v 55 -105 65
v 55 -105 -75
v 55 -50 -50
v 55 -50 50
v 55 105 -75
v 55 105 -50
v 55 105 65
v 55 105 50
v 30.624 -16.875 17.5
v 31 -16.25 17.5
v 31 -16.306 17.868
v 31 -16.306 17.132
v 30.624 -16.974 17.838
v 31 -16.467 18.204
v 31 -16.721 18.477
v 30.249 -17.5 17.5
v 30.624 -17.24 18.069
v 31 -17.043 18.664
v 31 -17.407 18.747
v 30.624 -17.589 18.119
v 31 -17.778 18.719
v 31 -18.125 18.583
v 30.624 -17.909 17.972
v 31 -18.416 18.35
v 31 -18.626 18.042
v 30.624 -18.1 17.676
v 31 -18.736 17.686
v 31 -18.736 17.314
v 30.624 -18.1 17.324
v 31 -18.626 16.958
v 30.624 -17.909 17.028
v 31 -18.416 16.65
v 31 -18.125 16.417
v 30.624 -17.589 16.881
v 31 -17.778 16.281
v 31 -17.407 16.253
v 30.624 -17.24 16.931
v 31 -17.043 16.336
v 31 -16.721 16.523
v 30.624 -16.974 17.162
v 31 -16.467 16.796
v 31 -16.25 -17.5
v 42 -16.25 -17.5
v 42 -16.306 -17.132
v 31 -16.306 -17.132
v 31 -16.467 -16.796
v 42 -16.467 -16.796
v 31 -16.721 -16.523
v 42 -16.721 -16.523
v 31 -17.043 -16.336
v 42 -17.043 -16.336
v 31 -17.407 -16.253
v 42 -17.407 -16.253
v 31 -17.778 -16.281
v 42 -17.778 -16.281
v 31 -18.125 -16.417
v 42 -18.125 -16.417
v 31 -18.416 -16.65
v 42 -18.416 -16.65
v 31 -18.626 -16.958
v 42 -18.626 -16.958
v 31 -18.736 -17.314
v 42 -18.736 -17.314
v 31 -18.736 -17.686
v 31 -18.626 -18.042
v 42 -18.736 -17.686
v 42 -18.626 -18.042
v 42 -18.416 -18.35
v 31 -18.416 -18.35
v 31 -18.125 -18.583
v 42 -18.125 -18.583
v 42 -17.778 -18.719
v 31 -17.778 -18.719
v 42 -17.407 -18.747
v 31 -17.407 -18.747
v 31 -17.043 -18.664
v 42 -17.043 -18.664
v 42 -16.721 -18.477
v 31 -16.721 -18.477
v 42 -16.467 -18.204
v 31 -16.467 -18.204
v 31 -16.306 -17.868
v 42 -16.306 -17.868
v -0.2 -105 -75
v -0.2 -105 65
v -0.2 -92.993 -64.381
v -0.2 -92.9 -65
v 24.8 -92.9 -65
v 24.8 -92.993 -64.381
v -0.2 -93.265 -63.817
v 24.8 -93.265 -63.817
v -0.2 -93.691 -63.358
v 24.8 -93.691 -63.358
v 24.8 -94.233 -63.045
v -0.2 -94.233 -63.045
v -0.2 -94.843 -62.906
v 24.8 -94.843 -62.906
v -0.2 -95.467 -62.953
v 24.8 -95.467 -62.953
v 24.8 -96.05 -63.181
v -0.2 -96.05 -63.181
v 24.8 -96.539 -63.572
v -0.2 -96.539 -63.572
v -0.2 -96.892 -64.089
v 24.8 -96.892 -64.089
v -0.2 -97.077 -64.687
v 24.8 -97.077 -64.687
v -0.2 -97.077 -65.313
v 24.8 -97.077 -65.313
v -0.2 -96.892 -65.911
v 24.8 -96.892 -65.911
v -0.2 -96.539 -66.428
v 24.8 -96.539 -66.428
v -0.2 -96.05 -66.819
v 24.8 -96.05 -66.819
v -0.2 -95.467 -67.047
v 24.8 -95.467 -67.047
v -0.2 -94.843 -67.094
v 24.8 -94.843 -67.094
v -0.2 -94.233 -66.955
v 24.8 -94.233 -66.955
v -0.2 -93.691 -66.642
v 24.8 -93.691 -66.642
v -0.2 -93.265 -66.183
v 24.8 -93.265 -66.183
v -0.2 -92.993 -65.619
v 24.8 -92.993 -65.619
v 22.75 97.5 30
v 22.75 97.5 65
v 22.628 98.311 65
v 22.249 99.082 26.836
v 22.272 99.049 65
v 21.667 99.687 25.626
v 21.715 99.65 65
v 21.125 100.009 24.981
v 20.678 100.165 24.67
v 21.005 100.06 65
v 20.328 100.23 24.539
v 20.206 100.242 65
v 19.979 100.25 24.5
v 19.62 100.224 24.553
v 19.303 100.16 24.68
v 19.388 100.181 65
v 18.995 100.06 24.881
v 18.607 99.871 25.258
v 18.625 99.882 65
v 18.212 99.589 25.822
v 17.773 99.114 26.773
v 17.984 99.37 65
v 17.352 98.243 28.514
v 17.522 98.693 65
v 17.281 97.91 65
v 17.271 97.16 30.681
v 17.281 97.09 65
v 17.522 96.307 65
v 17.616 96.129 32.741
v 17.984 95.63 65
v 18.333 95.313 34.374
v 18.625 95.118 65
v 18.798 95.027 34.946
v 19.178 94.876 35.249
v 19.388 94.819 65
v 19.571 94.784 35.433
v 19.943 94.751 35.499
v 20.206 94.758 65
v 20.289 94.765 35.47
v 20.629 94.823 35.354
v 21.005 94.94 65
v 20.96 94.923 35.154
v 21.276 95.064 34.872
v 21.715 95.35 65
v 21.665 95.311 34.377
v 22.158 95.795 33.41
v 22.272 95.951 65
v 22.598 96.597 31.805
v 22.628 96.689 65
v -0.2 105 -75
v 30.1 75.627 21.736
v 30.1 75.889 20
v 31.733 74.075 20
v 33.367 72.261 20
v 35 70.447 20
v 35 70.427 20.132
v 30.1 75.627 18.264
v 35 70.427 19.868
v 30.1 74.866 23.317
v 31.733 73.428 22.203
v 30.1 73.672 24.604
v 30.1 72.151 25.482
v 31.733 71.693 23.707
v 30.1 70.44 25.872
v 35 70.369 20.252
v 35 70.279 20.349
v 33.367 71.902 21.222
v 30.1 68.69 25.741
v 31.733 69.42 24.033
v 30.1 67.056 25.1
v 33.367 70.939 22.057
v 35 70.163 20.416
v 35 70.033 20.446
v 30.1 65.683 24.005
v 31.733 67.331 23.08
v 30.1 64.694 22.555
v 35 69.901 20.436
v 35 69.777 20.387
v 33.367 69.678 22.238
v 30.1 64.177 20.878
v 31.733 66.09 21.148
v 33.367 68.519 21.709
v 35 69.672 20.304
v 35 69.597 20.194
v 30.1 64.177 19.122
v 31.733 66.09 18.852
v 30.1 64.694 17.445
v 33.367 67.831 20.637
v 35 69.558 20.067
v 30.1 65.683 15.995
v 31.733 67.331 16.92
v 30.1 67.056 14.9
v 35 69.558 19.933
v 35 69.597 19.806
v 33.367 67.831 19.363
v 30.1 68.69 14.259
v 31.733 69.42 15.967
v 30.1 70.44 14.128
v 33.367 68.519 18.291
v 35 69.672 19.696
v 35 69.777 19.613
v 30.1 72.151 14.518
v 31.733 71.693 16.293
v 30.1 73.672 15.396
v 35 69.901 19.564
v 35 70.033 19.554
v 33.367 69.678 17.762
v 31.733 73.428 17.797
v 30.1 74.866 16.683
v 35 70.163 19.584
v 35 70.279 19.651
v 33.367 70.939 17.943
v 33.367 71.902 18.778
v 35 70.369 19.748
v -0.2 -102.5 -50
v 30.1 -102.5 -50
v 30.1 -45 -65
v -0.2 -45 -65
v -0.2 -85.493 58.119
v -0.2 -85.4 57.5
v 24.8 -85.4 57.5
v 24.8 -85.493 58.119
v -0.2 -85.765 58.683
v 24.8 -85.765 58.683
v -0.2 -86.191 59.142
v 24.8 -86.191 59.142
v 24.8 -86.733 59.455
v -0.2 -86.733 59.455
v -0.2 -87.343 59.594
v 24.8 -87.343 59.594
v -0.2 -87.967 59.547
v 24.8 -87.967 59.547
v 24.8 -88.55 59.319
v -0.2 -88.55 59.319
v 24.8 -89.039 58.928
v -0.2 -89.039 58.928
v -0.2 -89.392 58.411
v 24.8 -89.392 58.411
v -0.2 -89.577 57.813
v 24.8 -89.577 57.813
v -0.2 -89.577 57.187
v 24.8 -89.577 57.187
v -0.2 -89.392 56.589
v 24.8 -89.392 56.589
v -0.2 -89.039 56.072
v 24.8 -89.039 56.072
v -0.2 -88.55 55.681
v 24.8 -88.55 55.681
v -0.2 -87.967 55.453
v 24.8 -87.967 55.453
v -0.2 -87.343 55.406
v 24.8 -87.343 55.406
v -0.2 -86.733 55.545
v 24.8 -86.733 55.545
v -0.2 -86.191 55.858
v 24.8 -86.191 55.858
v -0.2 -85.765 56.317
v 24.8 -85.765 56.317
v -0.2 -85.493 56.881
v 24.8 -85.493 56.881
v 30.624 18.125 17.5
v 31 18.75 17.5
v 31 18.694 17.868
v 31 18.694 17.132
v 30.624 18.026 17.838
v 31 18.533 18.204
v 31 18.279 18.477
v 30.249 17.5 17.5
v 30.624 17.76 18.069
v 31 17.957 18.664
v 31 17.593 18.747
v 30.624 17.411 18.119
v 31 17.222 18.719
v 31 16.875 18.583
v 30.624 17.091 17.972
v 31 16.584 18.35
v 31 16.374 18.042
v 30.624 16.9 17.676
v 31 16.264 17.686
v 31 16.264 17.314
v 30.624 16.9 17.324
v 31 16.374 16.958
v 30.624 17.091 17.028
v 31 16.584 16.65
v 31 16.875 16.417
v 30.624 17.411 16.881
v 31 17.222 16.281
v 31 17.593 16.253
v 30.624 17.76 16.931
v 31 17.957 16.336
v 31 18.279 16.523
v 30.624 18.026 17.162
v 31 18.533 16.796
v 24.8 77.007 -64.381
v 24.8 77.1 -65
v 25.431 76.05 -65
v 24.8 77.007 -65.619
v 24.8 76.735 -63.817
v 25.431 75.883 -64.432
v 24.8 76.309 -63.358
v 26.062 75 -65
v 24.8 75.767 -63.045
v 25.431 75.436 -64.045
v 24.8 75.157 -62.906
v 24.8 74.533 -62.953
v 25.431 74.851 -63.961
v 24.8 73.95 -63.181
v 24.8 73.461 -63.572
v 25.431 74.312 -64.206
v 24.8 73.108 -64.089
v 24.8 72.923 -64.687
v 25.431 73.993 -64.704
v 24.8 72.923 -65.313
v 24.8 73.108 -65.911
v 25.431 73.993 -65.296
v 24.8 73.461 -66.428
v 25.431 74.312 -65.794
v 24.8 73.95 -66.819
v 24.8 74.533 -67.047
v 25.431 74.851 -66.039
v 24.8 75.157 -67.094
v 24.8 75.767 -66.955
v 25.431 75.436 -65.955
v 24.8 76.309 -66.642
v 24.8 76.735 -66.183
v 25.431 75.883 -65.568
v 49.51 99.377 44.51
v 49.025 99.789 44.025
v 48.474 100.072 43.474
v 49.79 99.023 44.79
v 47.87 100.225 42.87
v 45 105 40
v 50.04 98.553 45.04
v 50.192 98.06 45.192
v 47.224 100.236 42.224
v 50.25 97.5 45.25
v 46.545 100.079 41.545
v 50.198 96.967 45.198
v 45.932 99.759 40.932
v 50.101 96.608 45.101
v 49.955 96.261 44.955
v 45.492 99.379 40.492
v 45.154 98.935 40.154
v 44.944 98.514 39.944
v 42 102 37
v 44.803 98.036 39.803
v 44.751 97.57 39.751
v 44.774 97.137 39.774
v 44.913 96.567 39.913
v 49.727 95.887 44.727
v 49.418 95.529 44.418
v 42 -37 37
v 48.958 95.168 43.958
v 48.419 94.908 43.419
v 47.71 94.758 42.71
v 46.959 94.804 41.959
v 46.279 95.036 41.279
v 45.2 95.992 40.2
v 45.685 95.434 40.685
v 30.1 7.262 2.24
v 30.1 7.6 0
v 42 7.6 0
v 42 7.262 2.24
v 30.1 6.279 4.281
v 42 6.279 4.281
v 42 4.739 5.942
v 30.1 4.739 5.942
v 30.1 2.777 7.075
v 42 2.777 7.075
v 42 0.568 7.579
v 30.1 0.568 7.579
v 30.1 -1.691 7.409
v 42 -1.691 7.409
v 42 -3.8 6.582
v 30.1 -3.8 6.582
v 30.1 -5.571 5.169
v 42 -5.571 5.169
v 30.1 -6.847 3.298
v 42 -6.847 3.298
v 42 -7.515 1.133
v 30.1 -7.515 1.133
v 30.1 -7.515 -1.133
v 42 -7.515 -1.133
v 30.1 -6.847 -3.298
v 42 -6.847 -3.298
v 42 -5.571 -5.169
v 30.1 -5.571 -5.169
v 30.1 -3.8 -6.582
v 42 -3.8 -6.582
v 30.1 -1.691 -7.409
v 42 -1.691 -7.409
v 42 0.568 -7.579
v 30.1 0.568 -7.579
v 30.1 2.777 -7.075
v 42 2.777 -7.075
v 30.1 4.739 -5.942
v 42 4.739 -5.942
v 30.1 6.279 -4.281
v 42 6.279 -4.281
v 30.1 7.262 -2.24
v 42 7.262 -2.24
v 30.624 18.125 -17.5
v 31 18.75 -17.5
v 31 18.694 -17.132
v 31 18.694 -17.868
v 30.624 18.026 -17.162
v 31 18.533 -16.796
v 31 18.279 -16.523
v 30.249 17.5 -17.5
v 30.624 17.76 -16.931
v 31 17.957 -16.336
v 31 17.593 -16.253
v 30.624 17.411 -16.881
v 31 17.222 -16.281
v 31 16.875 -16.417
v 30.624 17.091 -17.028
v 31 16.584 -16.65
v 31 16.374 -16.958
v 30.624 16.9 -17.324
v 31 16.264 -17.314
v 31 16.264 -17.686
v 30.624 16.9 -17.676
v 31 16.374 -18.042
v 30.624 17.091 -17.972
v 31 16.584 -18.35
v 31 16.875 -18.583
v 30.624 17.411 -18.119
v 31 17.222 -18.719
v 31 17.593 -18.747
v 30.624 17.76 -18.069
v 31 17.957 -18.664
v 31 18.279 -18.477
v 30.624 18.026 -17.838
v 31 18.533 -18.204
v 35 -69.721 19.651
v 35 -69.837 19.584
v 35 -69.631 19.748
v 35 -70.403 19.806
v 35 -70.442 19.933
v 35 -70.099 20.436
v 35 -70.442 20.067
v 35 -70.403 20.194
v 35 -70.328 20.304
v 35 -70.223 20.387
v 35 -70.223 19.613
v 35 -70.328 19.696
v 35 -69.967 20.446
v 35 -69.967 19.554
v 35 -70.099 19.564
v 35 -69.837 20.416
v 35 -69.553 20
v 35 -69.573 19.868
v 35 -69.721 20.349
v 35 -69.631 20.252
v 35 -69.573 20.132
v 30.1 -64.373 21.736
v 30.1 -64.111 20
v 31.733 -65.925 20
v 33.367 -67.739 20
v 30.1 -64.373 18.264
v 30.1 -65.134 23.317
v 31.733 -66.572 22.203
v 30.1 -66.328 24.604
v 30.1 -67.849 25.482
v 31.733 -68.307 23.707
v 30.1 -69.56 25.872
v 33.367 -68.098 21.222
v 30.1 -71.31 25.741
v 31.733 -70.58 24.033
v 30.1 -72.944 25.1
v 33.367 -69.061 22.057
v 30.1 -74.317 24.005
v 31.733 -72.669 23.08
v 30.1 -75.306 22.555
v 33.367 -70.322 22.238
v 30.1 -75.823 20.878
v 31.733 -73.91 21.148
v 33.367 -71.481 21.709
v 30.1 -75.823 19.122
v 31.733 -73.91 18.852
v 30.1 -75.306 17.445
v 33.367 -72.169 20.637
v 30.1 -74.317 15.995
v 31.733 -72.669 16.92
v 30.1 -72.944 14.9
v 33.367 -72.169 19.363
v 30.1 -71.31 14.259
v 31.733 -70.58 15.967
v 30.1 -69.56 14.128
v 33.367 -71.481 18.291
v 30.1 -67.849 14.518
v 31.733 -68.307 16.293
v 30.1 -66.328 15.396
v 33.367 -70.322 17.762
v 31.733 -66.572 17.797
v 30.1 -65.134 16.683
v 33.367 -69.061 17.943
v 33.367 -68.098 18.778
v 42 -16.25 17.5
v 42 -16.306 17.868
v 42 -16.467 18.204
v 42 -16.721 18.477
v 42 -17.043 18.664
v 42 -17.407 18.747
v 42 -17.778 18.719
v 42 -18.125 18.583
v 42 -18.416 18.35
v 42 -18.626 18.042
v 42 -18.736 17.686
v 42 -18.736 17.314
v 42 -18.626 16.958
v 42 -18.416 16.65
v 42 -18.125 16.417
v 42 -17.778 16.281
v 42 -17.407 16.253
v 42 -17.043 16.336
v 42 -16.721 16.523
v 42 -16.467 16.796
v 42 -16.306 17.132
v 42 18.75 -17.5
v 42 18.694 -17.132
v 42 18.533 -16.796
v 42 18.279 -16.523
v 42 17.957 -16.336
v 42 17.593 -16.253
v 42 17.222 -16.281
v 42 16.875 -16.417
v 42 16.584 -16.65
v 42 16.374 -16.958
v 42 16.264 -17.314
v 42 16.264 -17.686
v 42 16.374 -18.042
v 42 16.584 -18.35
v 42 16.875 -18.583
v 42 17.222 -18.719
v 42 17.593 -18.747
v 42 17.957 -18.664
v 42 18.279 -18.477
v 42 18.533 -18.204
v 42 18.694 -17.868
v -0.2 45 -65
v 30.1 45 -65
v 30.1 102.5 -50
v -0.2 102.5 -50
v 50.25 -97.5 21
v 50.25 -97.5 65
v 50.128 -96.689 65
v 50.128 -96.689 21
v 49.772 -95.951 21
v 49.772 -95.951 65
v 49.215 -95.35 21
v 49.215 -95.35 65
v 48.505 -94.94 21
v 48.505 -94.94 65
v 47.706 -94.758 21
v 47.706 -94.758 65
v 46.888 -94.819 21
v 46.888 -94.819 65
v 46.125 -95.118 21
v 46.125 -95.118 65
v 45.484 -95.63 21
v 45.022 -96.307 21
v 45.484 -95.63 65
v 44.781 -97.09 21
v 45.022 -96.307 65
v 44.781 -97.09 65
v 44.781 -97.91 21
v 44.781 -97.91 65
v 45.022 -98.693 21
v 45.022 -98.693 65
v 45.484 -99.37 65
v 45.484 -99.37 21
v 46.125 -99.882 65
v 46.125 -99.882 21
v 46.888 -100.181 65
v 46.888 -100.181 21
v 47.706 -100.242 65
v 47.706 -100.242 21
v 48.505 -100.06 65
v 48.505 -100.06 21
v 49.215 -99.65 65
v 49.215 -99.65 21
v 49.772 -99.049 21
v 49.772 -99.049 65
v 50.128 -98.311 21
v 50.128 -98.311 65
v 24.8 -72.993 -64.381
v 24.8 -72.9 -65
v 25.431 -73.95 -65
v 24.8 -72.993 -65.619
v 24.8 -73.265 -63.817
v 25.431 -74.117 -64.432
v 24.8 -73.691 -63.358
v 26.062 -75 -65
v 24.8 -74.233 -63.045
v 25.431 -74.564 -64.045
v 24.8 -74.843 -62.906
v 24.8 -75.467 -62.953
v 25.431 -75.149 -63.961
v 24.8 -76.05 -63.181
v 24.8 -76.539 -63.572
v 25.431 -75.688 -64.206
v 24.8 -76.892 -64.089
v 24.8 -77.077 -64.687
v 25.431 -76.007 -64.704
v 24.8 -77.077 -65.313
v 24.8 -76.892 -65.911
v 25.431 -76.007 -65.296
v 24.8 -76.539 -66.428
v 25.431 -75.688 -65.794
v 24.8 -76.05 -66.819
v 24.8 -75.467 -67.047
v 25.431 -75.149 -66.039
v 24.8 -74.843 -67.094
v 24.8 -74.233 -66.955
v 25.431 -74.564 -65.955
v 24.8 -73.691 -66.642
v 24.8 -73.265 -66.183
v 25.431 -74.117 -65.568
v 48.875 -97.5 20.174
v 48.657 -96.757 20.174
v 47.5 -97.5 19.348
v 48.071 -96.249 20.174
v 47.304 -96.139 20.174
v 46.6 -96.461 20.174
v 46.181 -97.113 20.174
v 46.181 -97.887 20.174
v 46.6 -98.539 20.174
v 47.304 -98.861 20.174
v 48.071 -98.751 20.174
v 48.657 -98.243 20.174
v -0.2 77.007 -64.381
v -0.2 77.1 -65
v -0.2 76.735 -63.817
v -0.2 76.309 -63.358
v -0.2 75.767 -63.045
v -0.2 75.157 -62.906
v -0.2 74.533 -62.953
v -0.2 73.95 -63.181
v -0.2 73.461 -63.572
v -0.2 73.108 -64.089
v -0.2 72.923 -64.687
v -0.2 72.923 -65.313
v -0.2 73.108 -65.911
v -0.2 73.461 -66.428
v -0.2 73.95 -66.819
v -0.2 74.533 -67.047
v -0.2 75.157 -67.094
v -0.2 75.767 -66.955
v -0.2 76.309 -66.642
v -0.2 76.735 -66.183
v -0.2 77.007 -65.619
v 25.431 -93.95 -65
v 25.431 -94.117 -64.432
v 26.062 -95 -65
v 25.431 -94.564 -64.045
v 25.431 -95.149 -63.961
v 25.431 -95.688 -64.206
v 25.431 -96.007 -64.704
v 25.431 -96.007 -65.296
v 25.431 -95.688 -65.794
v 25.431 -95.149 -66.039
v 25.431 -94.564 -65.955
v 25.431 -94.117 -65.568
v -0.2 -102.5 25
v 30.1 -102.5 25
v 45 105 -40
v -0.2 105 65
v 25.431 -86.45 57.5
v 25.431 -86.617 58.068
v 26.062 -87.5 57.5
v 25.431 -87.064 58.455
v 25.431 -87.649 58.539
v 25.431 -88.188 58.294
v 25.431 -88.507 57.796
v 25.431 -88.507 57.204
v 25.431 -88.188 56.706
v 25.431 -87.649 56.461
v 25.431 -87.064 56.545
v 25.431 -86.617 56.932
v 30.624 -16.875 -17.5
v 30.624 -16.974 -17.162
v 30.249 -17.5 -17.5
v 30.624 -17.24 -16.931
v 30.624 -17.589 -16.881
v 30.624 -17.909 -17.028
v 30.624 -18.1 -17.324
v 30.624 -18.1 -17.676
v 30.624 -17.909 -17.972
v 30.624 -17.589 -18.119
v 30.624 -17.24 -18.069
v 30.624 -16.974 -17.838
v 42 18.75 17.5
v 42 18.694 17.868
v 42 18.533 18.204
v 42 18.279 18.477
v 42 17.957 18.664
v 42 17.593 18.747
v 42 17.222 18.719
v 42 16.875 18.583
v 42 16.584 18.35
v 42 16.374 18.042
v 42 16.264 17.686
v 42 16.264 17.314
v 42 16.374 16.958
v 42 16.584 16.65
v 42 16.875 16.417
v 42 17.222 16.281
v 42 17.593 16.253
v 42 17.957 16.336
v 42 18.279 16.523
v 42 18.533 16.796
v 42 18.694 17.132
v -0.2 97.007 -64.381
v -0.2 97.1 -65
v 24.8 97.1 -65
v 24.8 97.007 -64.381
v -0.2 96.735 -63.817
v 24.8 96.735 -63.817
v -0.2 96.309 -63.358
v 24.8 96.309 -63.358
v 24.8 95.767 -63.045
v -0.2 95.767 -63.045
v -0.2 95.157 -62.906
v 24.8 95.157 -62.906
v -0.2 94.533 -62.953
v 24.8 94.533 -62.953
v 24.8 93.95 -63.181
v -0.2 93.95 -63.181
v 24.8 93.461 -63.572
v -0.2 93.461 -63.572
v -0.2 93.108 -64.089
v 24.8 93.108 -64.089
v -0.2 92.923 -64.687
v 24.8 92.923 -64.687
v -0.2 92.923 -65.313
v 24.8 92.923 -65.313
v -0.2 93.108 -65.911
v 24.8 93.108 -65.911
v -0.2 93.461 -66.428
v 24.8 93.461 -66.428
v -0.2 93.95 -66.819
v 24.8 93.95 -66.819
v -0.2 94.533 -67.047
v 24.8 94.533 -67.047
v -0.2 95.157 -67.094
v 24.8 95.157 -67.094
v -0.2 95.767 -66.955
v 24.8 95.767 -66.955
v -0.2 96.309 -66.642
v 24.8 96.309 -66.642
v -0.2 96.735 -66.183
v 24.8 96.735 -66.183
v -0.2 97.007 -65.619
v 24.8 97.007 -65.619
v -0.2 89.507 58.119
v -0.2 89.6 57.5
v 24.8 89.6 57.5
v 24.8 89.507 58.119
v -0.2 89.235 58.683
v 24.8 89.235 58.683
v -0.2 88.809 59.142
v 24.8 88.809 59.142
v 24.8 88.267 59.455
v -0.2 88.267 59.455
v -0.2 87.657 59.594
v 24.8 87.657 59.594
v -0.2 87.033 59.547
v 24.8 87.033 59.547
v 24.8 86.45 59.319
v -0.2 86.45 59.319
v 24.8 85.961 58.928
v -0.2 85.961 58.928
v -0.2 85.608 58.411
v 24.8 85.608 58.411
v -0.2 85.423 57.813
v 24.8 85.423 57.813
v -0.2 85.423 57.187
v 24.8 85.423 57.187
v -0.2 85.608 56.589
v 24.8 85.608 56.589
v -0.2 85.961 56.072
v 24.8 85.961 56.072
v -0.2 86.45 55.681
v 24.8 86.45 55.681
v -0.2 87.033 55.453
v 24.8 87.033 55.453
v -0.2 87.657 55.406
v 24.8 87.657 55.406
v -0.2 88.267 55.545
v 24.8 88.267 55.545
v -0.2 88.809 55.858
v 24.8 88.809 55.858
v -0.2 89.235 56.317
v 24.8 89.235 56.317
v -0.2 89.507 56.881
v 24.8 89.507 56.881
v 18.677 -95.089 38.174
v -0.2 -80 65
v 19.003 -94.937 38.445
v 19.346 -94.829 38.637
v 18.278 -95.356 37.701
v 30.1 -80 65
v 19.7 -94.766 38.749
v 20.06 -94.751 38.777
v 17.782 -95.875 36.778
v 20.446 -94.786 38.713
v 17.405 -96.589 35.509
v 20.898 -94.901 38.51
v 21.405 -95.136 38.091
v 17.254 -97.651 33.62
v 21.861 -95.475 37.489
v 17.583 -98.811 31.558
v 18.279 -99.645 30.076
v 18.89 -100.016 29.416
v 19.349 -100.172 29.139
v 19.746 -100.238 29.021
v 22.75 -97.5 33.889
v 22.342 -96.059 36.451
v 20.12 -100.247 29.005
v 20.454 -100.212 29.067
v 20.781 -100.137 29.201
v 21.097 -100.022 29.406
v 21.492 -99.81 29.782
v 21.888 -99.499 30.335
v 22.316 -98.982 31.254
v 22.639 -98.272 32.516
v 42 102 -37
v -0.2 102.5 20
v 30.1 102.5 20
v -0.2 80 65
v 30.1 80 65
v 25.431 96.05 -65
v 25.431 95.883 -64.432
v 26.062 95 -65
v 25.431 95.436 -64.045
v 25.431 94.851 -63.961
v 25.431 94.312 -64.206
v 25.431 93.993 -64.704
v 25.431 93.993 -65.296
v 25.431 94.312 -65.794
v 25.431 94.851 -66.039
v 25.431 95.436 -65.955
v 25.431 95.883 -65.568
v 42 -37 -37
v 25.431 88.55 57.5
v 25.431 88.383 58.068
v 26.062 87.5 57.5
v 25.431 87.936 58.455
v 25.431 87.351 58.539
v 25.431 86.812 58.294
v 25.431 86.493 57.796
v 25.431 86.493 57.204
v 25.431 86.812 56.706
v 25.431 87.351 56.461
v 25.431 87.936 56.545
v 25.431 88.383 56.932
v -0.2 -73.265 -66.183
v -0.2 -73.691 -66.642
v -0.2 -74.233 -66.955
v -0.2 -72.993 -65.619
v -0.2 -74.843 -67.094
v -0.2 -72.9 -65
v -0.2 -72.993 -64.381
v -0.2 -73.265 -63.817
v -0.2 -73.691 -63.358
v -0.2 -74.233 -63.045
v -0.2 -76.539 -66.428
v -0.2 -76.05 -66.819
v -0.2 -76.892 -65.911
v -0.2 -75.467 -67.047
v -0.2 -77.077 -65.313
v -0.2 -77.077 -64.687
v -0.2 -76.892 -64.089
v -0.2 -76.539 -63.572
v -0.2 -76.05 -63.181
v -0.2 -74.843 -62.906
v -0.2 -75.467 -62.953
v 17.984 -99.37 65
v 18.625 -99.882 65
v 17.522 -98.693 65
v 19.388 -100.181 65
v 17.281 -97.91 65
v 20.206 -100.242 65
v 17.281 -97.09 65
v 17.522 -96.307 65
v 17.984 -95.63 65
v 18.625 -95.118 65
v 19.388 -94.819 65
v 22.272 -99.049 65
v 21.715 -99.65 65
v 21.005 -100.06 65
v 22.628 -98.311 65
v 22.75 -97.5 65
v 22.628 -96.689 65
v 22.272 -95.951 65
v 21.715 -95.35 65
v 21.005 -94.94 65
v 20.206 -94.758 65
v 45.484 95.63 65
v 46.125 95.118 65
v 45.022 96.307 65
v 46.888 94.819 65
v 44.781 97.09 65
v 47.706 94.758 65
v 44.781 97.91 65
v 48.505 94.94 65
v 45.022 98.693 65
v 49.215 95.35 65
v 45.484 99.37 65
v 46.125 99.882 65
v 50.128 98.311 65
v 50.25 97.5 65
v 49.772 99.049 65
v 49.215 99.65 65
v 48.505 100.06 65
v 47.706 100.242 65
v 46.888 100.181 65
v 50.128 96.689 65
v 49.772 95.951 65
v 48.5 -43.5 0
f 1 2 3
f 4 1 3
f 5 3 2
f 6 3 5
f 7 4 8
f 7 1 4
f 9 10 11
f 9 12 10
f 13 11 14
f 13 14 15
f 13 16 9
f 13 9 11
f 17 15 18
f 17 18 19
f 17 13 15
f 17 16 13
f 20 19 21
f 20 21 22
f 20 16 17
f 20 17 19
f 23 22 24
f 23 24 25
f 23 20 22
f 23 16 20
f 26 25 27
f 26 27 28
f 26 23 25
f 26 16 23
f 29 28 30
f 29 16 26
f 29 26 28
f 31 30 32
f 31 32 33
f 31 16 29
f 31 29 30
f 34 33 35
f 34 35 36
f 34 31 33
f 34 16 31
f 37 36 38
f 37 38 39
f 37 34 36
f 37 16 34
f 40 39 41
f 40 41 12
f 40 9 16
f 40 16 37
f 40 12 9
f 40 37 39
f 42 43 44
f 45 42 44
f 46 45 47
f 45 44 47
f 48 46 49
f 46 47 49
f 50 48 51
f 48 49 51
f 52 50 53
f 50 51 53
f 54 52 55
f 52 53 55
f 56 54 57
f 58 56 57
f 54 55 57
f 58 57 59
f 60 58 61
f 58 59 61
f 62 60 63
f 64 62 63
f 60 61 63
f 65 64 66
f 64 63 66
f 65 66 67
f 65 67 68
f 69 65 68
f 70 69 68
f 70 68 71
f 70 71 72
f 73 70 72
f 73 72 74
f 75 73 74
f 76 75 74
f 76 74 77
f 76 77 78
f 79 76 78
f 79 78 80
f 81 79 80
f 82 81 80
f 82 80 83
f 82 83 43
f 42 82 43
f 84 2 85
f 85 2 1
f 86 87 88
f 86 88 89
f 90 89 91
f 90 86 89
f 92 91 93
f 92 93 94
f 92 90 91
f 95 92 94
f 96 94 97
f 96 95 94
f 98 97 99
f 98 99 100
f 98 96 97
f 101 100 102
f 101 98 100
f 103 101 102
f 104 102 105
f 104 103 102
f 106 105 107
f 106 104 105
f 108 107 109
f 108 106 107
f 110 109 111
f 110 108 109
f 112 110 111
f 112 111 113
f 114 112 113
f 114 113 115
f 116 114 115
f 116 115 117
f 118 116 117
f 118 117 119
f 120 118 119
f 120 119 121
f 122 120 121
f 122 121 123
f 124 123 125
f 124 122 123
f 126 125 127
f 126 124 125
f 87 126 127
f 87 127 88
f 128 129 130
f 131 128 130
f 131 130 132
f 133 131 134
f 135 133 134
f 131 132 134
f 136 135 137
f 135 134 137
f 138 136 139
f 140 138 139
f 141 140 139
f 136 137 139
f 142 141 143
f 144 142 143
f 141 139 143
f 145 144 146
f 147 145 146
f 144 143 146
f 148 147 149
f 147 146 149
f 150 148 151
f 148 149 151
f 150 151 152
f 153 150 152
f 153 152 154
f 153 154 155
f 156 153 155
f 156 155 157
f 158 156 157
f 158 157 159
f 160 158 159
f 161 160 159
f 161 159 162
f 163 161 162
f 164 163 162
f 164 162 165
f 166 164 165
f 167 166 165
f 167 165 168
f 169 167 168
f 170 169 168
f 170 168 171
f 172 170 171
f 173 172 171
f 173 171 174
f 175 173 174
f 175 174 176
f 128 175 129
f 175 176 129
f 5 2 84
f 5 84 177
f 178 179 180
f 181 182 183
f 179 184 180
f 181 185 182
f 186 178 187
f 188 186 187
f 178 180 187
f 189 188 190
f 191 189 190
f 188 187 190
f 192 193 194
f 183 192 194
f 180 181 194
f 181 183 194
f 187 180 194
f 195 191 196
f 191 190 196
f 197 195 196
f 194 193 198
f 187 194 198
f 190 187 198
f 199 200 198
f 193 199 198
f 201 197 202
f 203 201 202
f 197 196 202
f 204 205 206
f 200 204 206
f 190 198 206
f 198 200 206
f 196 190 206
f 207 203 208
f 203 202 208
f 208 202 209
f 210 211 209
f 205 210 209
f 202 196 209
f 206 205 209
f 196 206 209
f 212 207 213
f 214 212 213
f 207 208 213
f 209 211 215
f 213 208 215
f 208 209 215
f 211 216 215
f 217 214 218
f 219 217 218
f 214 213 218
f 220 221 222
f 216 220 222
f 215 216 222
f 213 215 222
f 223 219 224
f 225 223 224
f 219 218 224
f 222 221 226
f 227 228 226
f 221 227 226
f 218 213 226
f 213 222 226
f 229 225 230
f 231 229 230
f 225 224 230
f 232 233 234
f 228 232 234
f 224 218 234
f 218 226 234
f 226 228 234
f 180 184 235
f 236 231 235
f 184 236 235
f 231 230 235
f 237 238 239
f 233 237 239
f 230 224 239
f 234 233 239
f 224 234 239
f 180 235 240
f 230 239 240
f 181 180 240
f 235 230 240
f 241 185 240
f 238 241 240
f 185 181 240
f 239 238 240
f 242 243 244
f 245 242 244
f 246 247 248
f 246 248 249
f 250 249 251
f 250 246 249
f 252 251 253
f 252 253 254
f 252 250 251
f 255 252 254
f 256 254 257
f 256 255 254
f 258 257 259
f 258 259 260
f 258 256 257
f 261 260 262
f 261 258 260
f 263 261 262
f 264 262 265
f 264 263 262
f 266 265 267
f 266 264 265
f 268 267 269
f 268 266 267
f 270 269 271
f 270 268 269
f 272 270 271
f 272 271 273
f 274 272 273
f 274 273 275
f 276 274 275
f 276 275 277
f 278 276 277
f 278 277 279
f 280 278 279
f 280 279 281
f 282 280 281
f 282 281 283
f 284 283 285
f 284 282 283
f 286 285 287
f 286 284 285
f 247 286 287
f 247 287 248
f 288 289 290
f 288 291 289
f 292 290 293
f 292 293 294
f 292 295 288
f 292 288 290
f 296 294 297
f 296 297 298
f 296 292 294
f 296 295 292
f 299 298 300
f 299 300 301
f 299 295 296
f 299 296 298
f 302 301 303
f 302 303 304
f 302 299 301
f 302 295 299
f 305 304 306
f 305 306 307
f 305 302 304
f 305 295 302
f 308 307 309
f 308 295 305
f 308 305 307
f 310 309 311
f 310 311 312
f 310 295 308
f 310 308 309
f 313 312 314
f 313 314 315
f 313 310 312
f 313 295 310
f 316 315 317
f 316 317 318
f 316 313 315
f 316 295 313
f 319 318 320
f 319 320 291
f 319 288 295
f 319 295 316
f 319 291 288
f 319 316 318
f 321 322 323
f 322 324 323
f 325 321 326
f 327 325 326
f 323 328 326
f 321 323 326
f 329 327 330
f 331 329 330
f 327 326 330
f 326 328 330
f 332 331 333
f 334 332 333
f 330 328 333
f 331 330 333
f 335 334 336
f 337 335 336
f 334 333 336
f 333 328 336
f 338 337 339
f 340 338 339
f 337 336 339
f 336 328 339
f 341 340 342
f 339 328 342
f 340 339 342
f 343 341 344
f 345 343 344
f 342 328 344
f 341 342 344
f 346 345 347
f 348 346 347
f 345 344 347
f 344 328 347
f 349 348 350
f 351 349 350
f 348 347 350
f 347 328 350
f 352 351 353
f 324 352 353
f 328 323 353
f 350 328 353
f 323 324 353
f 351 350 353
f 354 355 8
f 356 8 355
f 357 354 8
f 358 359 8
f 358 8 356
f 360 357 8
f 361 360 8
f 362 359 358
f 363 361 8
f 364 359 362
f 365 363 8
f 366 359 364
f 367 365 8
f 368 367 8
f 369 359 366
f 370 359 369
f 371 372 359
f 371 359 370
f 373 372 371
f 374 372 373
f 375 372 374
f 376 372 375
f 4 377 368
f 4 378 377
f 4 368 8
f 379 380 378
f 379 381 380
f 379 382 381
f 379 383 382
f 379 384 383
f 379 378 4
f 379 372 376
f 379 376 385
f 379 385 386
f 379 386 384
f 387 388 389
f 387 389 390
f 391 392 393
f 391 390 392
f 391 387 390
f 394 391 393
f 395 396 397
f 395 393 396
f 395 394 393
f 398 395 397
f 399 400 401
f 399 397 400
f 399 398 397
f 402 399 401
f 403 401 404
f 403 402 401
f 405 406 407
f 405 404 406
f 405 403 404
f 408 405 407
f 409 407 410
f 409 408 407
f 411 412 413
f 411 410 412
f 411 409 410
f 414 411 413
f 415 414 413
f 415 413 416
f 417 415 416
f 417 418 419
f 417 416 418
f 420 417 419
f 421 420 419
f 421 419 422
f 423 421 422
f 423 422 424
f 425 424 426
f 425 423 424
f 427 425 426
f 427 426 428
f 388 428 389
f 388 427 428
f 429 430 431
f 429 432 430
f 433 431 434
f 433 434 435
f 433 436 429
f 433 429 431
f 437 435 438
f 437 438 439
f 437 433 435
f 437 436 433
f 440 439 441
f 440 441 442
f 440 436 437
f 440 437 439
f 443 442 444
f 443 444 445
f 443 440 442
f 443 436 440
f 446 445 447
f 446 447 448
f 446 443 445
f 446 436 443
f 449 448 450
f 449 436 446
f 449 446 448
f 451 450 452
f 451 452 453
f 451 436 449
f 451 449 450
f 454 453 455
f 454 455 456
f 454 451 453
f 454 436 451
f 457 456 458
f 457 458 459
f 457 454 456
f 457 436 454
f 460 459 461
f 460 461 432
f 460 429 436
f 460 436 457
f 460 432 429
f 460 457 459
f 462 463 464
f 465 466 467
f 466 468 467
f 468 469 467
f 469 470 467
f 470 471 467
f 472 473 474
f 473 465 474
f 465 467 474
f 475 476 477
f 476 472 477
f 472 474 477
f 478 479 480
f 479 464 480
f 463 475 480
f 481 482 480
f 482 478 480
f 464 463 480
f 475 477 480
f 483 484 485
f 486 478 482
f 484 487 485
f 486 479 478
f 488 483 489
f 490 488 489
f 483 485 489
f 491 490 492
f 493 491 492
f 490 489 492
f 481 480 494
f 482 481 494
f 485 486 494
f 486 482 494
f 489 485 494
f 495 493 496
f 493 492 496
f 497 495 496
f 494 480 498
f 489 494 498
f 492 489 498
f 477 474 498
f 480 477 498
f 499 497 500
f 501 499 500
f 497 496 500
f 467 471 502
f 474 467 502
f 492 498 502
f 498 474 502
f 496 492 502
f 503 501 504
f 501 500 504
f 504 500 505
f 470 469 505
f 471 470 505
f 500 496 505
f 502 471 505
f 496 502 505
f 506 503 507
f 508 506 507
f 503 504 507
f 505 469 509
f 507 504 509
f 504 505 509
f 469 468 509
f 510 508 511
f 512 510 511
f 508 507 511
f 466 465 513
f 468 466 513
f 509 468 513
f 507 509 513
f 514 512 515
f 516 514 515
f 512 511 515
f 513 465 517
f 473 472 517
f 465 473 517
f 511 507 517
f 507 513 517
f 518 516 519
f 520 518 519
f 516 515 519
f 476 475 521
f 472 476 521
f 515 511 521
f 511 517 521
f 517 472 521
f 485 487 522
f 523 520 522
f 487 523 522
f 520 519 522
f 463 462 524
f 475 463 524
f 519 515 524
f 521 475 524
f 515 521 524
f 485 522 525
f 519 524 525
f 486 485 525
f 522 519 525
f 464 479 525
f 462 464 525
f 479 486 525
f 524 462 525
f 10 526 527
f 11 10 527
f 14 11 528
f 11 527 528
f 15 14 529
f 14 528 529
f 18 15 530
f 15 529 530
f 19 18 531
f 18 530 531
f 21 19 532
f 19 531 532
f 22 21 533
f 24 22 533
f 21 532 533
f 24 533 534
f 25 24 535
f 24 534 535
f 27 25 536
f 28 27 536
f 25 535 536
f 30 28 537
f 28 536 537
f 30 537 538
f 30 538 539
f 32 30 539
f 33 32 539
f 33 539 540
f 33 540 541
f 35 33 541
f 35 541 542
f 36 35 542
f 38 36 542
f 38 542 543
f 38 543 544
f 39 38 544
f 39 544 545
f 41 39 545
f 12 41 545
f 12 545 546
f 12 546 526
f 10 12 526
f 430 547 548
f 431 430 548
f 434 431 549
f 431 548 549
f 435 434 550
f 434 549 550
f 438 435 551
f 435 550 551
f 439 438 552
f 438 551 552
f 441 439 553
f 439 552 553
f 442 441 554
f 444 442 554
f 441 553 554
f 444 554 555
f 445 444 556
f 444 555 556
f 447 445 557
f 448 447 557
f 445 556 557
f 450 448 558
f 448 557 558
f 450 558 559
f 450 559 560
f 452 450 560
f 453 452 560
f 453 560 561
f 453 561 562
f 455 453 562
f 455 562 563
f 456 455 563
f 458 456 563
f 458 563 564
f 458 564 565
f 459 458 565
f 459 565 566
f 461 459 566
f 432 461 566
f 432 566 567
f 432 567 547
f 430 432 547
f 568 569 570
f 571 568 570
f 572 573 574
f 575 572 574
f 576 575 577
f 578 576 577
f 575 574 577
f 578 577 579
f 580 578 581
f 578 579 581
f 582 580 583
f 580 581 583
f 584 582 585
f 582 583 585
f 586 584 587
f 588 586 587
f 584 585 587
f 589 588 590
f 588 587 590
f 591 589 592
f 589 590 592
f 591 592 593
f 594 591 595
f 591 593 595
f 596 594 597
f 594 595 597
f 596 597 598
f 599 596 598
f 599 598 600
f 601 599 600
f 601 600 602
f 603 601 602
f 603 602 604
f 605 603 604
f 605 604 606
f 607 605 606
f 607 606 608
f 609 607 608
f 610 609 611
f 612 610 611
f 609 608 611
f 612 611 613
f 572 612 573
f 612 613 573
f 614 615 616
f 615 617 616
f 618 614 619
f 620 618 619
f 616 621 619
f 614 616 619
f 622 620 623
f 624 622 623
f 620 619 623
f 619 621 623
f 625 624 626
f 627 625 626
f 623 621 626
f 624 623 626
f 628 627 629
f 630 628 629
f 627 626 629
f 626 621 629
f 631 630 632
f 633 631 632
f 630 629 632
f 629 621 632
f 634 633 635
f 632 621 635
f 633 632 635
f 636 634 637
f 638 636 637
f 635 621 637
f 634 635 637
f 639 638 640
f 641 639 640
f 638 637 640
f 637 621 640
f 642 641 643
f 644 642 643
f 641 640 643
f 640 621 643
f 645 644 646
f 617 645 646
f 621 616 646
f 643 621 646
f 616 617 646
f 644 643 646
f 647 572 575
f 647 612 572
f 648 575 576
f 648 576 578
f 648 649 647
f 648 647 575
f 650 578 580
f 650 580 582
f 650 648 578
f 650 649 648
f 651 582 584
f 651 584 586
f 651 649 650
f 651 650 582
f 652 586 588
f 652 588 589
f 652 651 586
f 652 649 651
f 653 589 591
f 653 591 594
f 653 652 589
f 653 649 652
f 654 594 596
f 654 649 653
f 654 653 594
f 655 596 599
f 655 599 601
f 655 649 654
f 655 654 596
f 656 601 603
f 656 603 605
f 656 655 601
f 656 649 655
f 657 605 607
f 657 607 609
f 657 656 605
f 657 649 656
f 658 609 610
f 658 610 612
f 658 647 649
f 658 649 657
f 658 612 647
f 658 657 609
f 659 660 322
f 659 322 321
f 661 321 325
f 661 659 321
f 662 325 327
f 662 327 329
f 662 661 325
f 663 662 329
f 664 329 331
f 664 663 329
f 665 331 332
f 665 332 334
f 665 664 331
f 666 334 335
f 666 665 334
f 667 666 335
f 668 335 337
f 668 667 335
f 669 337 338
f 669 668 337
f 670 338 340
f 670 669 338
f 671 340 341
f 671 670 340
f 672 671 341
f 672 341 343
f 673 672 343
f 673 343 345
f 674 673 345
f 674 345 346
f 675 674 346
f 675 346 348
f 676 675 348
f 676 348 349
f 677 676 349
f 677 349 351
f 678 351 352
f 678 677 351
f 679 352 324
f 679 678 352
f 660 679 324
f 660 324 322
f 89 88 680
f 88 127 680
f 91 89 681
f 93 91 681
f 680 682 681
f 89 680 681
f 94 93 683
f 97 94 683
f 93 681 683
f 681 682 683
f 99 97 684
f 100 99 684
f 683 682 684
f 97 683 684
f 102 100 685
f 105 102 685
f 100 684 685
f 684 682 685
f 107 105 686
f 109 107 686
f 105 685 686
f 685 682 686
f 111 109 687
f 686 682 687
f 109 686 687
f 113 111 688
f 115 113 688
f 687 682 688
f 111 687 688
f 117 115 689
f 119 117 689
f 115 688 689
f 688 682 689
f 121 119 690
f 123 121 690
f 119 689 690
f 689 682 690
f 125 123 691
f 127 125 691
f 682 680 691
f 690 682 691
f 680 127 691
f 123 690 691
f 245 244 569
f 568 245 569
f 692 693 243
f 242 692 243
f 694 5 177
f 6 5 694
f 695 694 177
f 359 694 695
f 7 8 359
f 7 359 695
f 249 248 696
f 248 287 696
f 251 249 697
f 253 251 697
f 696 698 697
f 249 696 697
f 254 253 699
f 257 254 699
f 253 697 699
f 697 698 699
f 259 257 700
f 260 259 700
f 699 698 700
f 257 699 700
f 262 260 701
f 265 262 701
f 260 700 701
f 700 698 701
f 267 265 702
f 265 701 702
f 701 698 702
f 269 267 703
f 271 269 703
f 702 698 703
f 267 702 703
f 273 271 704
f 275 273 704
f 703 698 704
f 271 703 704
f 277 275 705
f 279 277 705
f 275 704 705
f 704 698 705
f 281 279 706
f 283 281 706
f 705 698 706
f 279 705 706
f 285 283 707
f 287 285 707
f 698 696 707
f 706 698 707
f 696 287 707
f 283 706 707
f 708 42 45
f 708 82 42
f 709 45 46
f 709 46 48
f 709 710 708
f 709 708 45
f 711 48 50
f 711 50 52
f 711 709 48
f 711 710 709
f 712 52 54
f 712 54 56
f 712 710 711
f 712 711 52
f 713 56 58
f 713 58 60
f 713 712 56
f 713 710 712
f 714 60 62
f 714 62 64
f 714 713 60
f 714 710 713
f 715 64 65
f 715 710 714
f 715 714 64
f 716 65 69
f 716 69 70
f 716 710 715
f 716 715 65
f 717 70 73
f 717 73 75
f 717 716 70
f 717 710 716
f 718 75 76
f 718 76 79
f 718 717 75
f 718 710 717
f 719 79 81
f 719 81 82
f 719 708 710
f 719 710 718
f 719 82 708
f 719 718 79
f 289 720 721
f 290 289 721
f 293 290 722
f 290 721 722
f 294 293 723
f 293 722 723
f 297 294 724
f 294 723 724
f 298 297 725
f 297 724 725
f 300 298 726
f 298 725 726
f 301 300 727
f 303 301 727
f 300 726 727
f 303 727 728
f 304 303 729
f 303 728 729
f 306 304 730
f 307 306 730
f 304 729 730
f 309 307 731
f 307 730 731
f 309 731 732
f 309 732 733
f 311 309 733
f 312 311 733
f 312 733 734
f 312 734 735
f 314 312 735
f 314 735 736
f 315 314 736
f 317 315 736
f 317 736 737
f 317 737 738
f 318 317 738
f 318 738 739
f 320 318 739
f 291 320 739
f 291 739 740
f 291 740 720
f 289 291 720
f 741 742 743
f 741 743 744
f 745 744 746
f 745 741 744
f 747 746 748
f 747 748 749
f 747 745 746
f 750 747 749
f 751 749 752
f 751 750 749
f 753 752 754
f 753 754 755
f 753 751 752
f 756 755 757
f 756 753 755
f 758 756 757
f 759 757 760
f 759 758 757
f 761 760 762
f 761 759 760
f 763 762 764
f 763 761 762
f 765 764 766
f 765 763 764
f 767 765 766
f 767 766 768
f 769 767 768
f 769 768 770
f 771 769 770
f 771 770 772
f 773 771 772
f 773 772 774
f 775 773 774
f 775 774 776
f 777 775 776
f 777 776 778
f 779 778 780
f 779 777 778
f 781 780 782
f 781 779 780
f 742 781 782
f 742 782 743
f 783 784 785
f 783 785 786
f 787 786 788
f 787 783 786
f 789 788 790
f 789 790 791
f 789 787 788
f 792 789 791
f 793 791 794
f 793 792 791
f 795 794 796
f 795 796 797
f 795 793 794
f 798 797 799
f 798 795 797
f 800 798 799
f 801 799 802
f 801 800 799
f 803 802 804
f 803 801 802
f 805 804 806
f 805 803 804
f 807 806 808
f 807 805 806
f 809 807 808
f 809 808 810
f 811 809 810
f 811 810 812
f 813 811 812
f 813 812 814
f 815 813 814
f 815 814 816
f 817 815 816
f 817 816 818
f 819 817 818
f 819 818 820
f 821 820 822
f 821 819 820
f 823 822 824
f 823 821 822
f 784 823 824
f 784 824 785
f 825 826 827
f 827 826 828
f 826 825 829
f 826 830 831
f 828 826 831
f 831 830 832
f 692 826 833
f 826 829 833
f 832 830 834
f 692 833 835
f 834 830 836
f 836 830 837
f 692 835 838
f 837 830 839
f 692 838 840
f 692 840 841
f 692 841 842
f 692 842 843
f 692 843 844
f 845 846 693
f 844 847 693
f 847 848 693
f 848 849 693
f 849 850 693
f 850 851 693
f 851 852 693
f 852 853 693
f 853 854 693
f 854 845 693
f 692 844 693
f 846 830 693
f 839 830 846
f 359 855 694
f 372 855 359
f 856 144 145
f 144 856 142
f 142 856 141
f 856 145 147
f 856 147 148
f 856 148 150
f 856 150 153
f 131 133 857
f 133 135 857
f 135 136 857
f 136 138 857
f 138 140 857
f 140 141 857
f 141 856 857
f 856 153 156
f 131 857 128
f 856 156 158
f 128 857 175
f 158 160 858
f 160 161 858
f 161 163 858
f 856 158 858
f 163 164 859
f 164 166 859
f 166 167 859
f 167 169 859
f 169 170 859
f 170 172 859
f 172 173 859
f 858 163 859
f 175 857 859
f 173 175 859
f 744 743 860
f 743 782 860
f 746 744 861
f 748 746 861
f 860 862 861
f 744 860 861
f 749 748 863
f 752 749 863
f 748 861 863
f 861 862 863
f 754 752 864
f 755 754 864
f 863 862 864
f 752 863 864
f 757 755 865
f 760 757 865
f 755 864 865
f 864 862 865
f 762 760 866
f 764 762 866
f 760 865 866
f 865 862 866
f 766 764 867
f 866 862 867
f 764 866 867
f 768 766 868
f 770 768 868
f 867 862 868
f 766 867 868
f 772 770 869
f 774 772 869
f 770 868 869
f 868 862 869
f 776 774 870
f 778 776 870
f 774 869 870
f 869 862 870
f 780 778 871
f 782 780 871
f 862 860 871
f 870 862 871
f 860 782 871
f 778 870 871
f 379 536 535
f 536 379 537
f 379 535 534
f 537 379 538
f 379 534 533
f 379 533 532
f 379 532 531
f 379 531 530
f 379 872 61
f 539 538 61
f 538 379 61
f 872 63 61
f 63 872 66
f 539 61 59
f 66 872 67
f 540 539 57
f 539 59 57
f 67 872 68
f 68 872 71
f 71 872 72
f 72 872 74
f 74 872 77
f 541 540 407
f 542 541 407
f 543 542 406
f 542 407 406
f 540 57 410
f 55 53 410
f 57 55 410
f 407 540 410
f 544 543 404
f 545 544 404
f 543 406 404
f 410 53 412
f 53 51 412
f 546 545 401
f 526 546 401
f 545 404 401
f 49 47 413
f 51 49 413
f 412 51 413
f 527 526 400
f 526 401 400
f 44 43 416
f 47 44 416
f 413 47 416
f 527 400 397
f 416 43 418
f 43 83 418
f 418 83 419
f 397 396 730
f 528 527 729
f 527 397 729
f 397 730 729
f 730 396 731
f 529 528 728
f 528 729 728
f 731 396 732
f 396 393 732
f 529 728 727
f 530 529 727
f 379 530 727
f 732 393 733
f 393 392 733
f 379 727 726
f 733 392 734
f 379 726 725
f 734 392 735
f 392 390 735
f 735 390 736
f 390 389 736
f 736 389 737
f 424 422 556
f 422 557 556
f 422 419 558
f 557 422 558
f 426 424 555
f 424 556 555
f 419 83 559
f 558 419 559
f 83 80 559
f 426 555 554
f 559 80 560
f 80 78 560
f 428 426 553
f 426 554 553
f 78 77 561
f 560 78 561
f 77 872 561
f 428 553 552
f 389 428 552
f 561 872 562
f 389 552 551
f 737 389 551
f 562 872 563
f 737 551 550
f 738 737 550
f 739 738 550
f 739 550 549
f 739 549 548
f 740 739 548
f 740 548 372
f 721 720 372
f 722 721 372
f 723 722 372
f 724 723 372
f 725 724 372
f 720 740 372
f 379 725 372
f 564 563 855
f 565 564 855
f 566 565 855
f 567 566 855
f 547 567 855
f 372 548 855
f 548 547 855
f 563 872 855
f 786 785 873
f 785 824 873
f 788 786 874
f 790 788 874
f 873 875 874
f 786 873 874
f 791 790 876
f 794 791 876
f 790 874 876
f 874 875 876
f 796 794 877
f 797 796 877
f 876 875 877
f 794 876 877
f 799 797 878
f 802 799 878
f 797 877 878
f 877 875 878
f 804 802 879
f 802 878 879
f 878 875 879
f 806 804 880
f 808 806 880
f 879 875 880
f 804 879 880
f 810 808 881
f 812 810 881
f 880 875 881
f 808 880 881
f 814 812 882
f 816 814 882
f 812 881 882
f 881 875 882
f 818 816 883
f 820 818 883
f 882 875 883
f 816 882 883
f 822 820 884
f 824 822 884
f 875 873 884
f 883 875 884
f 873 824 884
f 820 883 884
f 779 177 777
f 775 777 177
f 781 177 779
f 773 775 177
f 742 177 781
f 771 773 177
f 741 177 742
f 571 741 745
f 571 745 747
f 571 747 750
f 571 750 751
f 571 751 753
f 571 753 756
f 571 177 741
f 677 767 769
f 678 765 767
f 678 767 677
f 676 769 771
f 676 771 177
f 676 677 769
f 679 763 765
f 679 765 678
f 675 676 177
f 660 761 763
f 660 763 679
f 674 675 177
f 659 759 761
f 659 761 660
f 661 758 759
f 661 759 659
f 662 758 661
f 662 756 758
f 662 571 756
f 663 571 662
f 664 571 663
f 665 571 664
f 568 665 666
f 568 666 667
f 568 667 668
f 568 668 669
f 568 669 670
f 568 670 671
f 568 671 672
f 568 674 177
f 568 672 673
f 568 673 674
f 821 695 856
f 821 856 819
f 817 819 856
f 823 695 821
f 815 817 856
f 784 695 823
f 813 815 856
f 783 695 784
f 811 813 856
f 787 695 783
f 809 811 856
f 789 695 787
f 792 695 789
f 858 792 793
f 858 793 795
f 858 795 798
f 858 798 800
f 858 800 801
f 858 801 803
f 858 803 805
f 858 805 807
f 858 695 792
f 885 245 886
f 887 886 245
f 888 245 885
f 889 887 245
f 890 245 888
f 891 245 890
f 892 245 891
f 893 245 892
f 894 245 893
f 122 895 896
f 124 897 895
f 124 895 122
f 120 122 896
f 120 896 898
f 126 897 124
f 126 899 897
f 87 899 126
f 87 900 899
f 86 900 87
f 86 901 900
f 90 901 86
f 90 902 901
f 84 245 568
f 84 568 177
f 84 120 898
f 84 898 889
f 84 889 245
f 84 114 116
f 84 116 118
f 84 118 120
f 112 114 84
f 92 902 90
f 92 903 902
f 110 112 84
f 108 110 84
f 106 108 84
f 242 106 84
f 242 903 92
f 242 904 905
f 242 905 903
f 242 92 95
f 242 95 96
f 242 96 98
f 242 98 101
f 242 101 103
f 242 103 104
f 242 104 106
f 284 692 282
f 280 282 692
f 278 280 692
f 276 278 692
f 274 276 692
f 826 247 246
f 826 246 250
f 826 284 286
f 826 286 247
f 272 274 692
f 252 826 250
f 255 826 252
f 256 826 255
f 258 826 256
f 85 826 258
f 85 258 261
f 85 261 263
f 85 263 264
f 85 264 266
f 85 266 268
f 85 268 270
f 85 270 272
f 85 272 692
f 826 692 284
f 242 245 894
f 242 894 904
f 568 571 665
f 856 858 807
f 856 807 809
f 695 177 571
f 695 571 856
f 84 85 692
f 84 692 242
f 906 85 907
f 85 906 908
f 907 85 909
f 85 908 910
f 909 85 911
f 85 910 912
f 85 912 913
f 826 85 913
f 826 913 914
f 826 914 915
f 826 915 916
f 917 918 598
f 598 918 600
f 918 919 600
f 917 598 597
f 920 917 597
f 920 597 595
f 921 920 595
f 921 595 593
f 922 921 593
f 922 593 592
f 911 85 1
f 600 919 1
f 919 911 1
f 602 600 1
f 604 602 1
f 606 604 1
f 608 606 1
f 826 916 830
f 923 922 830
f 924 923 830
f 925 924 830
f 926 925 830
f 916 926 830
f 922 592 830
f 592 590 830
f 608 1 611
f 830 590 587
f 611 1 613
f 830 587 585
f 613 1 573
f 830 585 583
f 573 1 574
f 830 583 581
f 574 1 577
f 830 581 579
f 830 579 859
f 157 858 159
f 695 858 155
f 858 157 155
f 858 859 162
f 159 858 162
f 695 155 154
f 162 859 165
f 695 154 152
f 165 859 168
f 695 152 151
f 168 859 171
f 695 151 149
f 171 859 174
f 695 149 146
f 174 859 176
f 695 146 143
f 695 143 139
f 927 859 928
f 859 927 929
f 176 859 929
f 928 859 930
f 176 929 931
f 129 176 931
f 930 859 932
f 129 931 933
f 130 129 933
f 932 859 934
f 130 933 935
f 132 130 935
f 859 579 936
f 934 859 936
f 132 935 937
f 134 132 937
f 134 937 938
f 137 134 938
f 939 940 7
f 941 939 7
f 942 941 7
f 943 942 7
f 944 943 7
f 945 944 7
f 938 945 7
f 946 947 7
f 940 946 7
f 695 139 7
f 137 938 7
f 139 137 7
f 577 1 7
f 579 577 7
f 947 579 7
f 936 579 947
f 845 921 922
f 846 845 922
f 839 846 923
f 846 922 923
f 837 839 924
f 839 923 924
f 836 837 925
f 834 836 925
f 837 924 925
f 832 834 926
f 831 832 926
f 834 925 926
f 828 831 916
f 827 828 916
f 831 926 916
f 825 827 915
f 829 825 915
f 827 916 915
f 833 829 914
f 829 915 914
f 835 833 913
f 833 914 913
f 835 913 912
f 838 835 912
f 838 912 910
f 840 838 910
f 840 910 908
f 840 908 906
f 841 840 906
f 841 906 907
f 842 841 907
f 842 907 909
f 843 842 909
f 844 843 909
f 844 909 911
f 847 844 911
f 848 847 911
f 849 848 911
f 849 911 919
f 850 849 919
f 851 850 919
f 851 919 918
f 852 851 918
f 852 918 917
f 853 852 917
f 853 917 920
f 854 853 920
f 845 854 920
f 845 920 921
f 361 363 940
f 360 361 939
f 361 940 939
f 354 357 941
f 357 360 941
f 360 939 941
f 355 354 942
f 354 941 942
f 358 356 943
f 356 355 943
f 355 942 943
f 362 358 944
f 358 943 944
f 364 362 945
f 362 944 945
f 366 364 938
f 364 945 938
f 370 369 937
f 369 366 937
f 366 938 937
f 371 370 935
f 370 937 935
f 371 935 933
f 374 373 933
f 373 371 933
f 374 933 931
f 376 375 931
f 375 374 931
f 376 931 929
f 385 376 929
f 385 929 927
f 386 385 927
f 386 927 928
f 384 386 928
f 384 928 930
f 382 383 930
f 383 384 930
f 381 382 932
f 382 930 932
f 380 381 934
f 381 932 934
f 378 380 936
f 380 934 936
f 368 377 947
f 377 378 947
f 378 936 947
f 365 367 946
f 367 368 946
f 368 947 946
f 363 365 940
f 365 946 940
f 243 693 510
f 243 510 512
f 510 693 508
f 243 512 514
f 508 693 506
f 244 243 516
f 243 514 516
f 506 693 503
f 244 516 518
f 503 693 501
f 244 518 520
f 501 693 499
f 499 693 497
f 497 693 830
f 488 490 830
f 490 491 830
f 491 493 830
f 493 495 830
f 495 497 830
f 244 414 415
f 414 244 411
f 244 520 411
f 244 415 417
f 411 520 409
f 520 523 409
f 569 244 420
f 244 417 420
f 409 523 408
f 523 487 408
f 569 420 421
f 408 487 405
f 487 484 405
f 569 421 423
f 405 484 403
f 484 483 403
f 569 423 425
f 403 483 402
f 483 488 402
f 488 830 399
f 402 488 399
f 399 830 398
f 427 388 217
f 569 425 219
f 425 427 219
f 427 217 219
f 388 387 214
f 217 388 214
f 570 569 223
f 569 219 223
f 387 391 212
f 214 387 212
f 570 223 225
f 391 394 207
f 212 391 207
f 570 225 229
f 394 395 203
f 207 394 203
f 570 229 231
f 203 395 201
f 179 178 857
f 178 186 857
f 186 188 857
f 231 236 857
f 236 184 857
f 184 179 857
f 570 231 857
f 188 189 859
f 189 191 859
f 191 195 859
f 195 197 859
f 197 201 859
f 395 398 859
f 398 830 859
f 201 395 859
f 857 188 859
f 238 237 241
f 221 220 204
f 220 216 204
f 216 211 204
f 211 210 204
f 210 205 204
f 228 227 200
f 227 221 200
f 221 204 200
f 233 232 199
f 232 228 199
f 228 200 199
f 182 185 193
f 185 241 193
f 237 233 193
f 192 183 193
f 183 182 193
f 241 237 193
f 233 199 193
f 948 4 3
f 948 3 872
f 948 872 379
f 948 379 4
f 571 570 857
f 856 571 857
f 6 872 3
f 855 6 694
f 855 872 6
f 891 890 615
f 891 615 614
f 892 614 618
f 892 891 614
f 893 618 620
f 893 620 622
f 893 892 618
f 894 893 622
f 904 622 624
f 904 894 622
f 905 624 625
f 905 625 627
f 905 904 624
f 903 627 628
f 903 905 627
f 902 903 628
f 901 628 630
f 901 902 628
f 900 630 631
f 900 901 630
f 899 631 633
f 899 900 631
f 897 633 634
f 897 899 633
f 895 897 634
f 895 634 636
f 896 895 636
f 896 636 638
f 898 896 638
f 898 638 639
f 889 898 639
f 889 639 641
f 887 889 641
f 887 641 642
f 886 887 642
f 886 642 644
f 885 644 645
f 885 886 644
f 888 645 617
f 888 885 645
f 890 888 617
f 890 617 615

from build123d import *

# Parameters (mm, degrees)
SKETCH013_W     = 210
SKETCH013_H     = 140
PAD009_DEPTH    = 24.9
SKETCH014_R     = 6
POCKET002_DEPTH = 5
POCKET002_TAPER = 48
SKETCH015_R     = 7.6
POCKET003_DEPTH = 32
PAD013_DEPTH    = 31.2
SKETCH027_R     = 2.1
HOLE005_DEPTH   = 25
HOLE005_TIPS_R  = 2.1
SKETCH030_R     = 2.75
HOLE008_DEPTH   = 44
HOLE008_TIPS_R  = 2.75
SKETCH032_W     = 165
SKETCH032_H     = 100
POCKET008_DEPTH = 13
POCKET008_TAPER = 45
SKETCH033_R     = 1.25
HOLE009_DEPTH   = 14
HOLE009_TIPS_R  = 1.25


with BuildPart() as part:
    # Sketch013 → Pad009 (new body)
    with BuildSketch(Plane.YZ.offset(55)):
        with Locations((0, -5)):
            Rectangle(SKETCH013_W, SKETCH013_H)
    extrude(amount=-PAD009_DEPTH)

    # Sketch014 → Pocket002 (cut)
    with BuildSketch(Plane.YZ.offset(30)):
        with Locations((-70, 20)):
            Circle(SKETCH014_R)
        with Locations((70, 20)):
            Circle(SKETCH014_R)
    extrude(amount=POCKET002_DEPTH, taper=POCKET002_TAPER, mode=Mode.SUBTRACT)

    # Sketch015 → Pocket003 (cut)
    with BuildSketch(Plane.YZ.offset(30)):
        Circle(SKETCH015_R)
    extrude(amount=POCKET003_DEPTH, mode=Mode.SUBTRACT)

    # Sketch023 → Pad013 (join)
    with BuildSketch(Plane.YZ.offset(31)):
        Polygon((-105, 65), (-80, 65), (-102.5, 25), (-102.5, -50), (-45, -65), (45, -65), (102.5, -50), (102.5, 20), (80, 65), (105, 65), (105, -75), (-105, -75), align=None)
    extrude(amount=-PAD013_DEPTH)

    # Sketch027 → Hole005 (cut)
    with BuildSketch(Plane.YZ.offset(-0.2)):
        with Locations((-95, -65)):
            Circle(SKETCH027_R)
        with Locations((-75, -65)):
            Circle(SKETCH027_R)
        with Locations((95, -65)):
            Circle(SKETCH027_R)
        with Locations((75, -65)):
            Circle(SKETCH027_R)
        with Locations((-87.5, 57.5)):
            Circle(SKETCH027_R)
        with Locations((87.5, 57.5)):
            Circle(SKETCH027_R)
    extrude(amount=HOLE005_DEPTH, mode=Mode.SUBTRACT)

    # Hole005 tips → Hole005 tip 1 section 0
    with BuildSketch(Plane.YZ.offset(24.8), mode=Mode.PRIVATE) as hole005_tip_1_s0:
        with Locations((-95, -65)):
            Circle(HOLE005_TIPS_R)
    loft([hole005_tip_1_s0.sketch, Vertex(26.061807, -95, -65)], mode=Mode.SUBTRACT)

    # Hole005 tips → Hole005 tip 2 section 0
    with BuildSketch(Plane.YZ.offset(24.8), mode=Mode.PRIVATE) as hole005_tip_2_s0:
        with Locations((-75, -65)):
            Circle(HOLE005_TIPS_R)
    loft([hole005_tip_2_s0.sketch, Vertex(26.061807, -75, -65)], mode=Mode.SUBTRACT)

    # Hole005 tips → Hole005 tip 3 section 0
    with BuildSketch(Plane.YZ.offset(24.8), mode=Mode.PRIVATE) as hole005_tip_3_s0:
        with Locations((95, -65)):
            Circle(HOLE005_TIPS_R)
    loft([hole005_tip_3_s0.sketch, Vertex(26.061807, 95, -65)], mode=Mode.SUBTRACT)

    # Hole005 tips → Hole005 tip 4 section 0
    with BuildSketch(Plane.YZ.offset(24.8), mode=Mode.PRIVATE) as hole005_tip_4_s0:
        with Locations((75, -65)):
            Circle(HOLE005_TIPS_R)
    loft([hole005_tip_4_s0.sketch, Vertex(26.061807, 75, -65)], mode=Mode.SUBTRACT)

    # Hole005 tips → Hole005 tip 5 section 0
    with BuildSketch(Plane.YZ.offset(24.8), mode=Mode.PRIVATE) as hole005_tip_5_s0:
        with Locations((-87.5, 57.5)):
            Circle(HOLE005_TIPS_R)
    loft([hole005_tip_5_s0.sketch, Vertex(26.061807, -87.5, 57.5)], mode=Mode.SUBTRACT)

    # Hole005 tips → Hole005 tip 6 section 0
    with BuildSketch(Plane.YZ.offset(24.8), mode=Mode.PRIVATE) as hole005_tip_6_s0:
        with Locations((87.5, 57.5)):
            Circle(HOLE005_TIPS_R)
    loft([hole005_tip_6_s0.sketch, Vertex(26.061807, 87.5, 57.5)], mode=Mode.SUBTRACT)

    # Sketch030 → Hole008 (cut)
    with BuildSketch(Plane.XY.offset(65)):
        with Locations((20, -97.5)):
            Circle(SKETCH030_R)
        with Locations((47.5, -97.5)):
            Circle(SKETCH030_R)
        with Locations((20, 97.5)):
            Circle(SKETCH030_R)
        with Locations((47.5, 97.5)):
            Circle(SKETCH030_R)
    extrude(amount=-HOLE008_DEPTH, mode=Mode.SUBTRACT)

    # Hole008 tips → Hole008 tip 1 section 0
    with BuildSketch(Plane.XY.offset(21), mode=Mode.PRIVATE) as hole008_tip_1_s0:
        with Locations((20, -97.5)):
            Circle(HOLE008_TIPS_R)
    loft([hole008_tip_1_s0.sketch, Vertex(20, -97.5, 19.347633)], mode=Mode.SUBTRACT)

    # Hole008 tips → Hole008 tip 2 section 0
    with BuildSketch(Plane.XY.offset(21), mode=Mode.PRIVATE) as hole008_tip_2_s0:
        with Locations((47.5, -97.5)):
            Circle(HOLE008_TIPS_R)
    loft([hole008_tip_2_s0.sketch, Vertex(47.5, -97.5, 19.347633)], mode=Mode.SUBTRACT)

    # Hole008 tips → Hole008 tip 3 section 0
    with BuildSketch(Plane.XY.offset(21), mode=Mode.PRIVATE) as hole008_tip_3_s0:
        with Locations((20, 97.5)):
            Circle(HOLE008_TIPS_R)
    loft([hole008_tip_3_s0.sketch, Vertex(20, 97.5, 19.347633)], mode=Mode.SUBTRACT)

    # Hole008 tips → Hole008 tip 4 section 0
    with BuildSketch(Plane.XY.offset(21), mode=Mode.PRIVATE) as hole008_tip_4_s0:
        with Locations((47.5, 97.5)):
            Circle(HOLE008_TIPS_R)
    loft([hole008_tip_4_s0.sketch, Vertex(47.5, 97.5, 19.347633)], mode=Mode.SUBTRACT)

    # Sketch032 → Pocket008 (cut)
    with BuildSketch(Plane.YZ.offset(55)):
        with Locations((32.5, 0)):
            Rectangle(SKETCH032_W, SKETCH032_H)
    extrude(amount=-POCKET008_DEPTH, taper=POCKET008_TAPER, mode=Mode.SUBTRACT)

    # Sketch033 → Hole009 (cut)
    with BuildSketch(Plane.YZ.offset(45)):
        with Locations((-17.5, 17.5)):
            Circle(SKETCH033_R)
        with Locations((17.5, 17.5)):
            Circle(SKETCH033_R)
        with Locations((-17.5, -17.5)):
            Circle(SKETCH033_R)
        with Locations((17.5, -17.5)):
            Circle(SKETCH033_R)
    extrude(amount=-HOLE009_DEPTH, mode=Mode.SUBTRACT)

    # Hole009 tips → Hole009 tip 1 section 0
    with BuildSketch(Plane.YZ.offset(31), mode=Mode.PRIVATE) as hole009_tip_1_s0:
        with Locations((-17.5, 17.5)):
            Circle(HOLE009_TIPS_R)
    loft([hole009_tip_1_s0.sketch, Vertex(30.248924, -17.5, 17.5)], mode=Mode.SUBTRACT)

    # Hole009 tips → Hole009 tip 2 section 0
    with BuildSketch(Plane.YZ.offset(31), mode=Mode.PRIVATE) as hole009_tip_2_s0:
        with Locations((17.5, 17.5)):
            Circle(HOLE009_TIPS_R)
    loft([hole009_tip_2_s0.sketch, Vertex(30.248924, 17.5, 17.5)], mode=Mode.SUBTRACT)

    # Hole009 tips → Hole009 tip 3 section 0
    with BuildSketch(Plane.YZ.offset(31), mode=Mode.PRIVATE) as hole009_tip_3_s0:
        with Locations((-17.5, -17.5)):
            Circle(HOLE009_TIPS_R)
    loft([hole009_tip_3_s0.sketch, Vertex(30.248924, -17.5, -17.5)], mode=Mode.SUBTRACT)

    # Hole009 tips → Hole009 tip 4 section 0
    with BuildSketch(Plane.YZ.offset(31), mode=Mode.PRIVATE) as hole009_tip_4_s0:
        with Locations((17.5, -17.5)):
            Circle(HOLE009_TIPS_R)
    loft([hole009_tip_4_s0.sketch, Vertex(30.248924, 17.5, -17.5)], mode=Mode.SUBTRACT)


solid = part.part
